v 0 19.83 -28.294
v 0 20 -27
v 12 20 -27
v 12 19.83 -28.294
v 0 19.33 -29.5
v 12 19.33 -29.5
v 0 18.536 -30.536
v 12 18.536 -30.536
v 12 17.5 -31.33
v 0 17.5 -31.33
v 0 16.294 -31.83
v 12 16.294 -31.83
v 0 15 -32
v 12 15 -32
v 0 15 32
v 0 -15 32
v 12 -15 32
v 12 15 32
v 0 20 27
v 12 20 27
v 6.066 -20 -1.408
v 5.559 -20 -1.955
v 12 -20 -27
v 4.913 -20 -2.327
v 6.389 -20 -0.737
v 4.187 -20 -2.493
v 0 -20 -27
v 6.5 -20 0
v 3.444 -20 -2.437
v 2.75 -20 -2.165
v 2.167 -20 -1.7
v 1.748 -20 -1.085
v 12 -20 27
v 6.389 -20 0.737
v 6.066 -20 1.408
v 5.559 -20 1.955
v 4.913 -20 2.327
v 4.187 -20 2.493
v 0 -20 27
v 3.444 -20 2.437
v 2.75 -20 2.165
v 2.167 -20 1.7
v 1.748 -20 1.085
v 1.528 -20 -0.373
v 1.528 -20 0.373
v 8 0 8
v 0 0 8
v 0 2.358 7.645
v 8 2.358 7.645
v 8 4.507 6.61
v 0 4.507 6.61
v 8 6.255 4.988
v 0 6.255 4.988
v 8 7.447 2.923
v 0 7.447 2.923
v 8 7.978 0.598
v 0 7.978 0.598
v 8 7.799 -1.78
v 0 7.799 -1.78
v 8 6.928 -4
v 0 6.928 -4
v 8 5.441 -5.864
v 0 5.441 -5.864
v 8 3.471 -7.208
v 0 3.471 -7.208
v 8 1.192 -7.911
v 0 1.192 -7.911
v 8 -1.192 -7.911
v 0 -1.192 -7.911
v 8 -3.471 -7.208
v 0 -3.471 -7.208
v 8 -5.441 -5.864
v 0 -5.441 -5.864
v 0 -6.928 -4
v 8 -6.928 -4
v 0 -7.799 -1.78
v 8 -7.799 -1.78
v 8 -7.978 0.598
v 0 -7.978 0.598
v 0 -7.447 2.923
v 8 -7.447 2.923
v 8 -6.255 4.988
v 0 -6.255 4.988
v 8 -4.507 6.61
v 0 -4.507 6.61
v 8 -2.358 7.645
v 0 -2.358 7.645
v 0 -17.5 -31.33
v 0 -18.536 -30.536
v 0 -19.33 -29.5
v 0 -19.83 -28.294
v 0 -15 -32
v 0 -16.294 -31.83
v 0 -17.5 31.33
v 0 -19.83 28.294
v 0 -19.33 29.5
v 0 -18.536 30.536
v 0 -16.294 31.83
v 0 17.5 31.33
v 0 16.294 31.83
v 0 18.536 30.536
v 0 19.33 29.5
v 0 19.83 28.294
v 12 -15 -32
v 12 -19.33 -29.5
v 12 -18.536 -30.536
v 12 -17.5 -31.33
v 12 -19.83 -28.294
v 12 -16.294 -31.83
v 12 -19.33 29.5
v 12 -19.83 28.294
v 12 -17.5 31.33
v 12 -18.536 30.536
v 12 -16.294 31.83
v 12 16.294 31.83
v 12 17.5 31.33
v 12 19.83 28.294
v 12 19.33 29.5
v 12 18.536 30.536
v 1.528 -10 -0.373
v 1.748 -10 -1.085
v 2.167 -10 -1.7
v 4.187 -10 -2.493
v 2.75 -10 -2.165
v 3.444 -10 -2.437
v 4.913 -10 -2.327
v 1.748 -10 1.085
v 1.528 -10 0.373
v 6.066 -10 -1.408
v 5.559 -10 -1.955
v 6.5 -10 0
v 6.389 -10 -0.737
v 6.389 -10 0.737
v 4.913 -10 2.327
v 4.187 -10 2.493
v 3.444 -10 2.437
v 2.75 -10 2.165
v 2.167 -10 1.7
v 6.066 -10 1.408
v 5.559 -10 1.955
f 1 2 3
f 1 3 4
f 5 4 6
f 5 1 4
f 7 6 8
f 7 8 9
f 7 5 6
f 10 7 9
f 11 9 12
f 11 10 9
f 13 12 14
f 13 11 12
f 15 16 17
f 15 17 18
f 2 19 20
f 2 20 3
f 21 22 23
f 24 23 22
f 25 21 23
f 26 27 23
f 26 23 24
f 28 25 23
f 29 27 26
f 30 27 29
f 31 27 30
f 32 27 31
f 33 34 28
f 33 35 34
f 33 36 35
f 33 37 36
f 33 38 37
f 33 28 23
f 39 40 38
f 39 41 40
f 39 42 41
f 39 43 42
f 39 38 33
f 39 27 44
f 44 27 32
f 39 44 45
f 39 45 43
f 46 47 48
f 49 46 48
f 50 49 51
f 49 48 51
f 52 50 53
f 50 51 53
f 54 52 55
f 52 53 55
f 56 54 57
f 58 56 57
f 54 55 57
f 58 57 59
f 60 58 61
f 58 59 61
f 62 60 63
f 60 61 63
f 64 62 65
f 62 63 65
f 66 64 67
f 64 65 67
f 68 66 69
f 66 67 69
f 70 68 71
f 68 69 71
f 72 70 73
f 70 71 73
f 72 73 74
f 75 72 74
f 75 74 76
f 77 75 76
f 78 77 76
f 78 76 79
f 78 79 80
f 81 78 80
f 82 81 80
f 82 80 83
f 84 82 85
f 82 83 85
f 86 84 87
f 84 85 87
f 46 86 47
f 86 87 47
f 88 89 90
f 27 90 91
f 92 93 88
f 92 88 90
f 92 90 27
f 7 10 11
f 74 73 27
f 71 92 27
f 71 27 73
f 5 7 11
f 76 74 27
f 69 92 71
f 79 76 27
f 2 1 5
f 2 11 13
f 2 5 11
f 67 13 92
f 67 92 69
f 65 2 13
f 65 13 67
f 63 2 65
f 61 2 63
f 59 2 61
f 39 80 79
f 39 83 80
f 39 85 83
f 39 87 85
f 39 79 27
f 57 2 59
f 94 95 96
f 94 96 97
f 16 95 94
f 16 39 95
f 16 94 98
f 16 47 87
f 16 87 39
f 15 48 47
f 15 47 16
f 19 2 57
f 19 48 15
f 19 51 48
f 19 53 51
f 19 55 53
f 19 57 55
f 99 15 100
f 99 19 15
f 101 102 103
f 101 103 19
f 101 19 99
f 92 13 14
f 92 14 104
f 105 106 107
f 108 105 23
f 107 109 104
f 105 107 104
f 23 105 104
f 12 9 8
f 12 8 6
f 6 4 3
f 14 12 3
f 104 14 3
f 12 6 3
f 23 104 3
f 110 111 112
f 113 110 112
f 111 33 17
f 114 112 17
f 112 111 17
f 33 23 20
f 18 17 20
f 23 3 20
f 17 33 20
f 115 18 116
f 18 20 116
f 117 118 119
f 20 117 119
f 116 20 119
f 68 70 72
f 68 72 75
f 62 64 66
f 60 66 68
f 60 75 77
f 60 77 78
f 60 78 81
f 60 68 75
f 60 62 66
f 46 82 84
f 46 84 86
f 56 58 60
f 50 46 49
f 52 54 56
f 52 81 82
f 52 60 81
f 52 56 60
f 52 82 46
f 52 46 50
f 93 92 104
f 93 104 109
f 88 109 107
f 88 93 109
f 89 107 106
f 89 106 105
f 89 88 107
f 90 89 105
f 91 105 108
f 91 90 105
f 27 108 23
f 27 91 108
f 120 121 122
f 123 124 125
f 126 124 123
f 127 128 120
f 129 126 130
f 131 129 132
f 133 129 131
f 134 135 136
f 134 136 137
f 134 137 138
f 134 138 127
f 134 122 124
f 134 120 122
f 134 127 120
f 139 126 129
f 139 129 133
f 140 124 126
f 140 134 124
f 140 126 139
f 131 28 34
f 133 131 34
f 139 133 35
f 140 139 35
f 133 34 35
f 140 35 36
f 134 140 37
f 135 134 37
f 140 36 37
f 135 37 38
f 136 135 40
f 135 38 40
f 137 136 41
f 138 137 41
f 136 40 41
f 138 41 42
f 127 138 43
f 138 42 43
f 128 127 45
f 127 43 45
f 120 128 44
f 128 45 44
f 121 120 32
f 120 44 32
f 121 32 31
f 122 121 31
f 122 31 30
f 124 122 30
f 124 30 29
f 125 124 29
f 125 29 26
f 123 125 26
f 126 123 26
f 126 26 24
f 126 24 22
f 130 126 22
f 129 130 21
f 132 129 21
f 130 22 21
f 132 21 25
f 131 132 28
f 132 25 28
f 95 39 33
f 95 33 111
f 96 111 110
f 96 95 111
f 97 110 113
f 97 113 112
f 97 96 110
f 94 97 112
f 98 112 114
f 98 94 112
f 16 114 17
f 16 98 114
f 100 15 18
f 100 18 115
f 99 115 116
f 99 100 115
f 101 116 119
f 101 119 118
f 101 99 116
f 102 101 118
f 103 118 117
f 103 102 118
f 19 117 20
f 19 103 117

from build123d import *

# Parameters (mm, degrees)
EXTRUDE_1_DEPTH     = 12
SKETCH_2_R          = 8
CUT_EXTRUDE_1_DEPTH = 8
SKETCH_3_R          = 2.5
CUT_EXTRUDE_2_DEPTH = 10


with BuildPart() as part:
    # 草图1 → 凸台-拉伸1 (new body)
    with BuildSketch(Plane(origin=(0, 0, 0), x_dir=(0, 0, -1), z_dir=(1, 0, 0))):
        with BuildLine():
            Line((-27, 20), (27, 20))
            ThreePointArc((27, 20), (30.535533906, 18.535533906), (32, 15))
            Line((32, 15), (32, -15))
            ThreePointArc((32, -15), (30.535533906, -18.535533906), (27, -20))
            Line((27, -20), (-27, -20))
            ThreePointArc((-27, -20), (-30.535533906, -18.535533906), (-32, -15))
            Line((-32, -15), (-32, 15))
            ThreePointArc((-32, 15), (-30.535533906, 18.535533906), (-27, 20))
        make_face()
    extrude(amount=EXTRUDE_1_DEPTH)

    # 草图2 → 切除-拉伸1 (cut)
    with BuildSketch(Plane.ZY):
        Circle(SKETCH_2_R)
    extrude(amount=-CUT_EXTRUDE_1_DEPTH, mode=Mode.SUBTRACT)

    # 草图3 → 切除-拉伸2 (cut)
    with BuildSketch(Plane.XZ.offset(20)):
        with Locations((4, 0)):
            Circle(SKETCH_3_R)
    extrude(amount=-CUT_EXTRUDE_2_DEPTH, mode=Mode.SUBTRACT)


solid = part.part
